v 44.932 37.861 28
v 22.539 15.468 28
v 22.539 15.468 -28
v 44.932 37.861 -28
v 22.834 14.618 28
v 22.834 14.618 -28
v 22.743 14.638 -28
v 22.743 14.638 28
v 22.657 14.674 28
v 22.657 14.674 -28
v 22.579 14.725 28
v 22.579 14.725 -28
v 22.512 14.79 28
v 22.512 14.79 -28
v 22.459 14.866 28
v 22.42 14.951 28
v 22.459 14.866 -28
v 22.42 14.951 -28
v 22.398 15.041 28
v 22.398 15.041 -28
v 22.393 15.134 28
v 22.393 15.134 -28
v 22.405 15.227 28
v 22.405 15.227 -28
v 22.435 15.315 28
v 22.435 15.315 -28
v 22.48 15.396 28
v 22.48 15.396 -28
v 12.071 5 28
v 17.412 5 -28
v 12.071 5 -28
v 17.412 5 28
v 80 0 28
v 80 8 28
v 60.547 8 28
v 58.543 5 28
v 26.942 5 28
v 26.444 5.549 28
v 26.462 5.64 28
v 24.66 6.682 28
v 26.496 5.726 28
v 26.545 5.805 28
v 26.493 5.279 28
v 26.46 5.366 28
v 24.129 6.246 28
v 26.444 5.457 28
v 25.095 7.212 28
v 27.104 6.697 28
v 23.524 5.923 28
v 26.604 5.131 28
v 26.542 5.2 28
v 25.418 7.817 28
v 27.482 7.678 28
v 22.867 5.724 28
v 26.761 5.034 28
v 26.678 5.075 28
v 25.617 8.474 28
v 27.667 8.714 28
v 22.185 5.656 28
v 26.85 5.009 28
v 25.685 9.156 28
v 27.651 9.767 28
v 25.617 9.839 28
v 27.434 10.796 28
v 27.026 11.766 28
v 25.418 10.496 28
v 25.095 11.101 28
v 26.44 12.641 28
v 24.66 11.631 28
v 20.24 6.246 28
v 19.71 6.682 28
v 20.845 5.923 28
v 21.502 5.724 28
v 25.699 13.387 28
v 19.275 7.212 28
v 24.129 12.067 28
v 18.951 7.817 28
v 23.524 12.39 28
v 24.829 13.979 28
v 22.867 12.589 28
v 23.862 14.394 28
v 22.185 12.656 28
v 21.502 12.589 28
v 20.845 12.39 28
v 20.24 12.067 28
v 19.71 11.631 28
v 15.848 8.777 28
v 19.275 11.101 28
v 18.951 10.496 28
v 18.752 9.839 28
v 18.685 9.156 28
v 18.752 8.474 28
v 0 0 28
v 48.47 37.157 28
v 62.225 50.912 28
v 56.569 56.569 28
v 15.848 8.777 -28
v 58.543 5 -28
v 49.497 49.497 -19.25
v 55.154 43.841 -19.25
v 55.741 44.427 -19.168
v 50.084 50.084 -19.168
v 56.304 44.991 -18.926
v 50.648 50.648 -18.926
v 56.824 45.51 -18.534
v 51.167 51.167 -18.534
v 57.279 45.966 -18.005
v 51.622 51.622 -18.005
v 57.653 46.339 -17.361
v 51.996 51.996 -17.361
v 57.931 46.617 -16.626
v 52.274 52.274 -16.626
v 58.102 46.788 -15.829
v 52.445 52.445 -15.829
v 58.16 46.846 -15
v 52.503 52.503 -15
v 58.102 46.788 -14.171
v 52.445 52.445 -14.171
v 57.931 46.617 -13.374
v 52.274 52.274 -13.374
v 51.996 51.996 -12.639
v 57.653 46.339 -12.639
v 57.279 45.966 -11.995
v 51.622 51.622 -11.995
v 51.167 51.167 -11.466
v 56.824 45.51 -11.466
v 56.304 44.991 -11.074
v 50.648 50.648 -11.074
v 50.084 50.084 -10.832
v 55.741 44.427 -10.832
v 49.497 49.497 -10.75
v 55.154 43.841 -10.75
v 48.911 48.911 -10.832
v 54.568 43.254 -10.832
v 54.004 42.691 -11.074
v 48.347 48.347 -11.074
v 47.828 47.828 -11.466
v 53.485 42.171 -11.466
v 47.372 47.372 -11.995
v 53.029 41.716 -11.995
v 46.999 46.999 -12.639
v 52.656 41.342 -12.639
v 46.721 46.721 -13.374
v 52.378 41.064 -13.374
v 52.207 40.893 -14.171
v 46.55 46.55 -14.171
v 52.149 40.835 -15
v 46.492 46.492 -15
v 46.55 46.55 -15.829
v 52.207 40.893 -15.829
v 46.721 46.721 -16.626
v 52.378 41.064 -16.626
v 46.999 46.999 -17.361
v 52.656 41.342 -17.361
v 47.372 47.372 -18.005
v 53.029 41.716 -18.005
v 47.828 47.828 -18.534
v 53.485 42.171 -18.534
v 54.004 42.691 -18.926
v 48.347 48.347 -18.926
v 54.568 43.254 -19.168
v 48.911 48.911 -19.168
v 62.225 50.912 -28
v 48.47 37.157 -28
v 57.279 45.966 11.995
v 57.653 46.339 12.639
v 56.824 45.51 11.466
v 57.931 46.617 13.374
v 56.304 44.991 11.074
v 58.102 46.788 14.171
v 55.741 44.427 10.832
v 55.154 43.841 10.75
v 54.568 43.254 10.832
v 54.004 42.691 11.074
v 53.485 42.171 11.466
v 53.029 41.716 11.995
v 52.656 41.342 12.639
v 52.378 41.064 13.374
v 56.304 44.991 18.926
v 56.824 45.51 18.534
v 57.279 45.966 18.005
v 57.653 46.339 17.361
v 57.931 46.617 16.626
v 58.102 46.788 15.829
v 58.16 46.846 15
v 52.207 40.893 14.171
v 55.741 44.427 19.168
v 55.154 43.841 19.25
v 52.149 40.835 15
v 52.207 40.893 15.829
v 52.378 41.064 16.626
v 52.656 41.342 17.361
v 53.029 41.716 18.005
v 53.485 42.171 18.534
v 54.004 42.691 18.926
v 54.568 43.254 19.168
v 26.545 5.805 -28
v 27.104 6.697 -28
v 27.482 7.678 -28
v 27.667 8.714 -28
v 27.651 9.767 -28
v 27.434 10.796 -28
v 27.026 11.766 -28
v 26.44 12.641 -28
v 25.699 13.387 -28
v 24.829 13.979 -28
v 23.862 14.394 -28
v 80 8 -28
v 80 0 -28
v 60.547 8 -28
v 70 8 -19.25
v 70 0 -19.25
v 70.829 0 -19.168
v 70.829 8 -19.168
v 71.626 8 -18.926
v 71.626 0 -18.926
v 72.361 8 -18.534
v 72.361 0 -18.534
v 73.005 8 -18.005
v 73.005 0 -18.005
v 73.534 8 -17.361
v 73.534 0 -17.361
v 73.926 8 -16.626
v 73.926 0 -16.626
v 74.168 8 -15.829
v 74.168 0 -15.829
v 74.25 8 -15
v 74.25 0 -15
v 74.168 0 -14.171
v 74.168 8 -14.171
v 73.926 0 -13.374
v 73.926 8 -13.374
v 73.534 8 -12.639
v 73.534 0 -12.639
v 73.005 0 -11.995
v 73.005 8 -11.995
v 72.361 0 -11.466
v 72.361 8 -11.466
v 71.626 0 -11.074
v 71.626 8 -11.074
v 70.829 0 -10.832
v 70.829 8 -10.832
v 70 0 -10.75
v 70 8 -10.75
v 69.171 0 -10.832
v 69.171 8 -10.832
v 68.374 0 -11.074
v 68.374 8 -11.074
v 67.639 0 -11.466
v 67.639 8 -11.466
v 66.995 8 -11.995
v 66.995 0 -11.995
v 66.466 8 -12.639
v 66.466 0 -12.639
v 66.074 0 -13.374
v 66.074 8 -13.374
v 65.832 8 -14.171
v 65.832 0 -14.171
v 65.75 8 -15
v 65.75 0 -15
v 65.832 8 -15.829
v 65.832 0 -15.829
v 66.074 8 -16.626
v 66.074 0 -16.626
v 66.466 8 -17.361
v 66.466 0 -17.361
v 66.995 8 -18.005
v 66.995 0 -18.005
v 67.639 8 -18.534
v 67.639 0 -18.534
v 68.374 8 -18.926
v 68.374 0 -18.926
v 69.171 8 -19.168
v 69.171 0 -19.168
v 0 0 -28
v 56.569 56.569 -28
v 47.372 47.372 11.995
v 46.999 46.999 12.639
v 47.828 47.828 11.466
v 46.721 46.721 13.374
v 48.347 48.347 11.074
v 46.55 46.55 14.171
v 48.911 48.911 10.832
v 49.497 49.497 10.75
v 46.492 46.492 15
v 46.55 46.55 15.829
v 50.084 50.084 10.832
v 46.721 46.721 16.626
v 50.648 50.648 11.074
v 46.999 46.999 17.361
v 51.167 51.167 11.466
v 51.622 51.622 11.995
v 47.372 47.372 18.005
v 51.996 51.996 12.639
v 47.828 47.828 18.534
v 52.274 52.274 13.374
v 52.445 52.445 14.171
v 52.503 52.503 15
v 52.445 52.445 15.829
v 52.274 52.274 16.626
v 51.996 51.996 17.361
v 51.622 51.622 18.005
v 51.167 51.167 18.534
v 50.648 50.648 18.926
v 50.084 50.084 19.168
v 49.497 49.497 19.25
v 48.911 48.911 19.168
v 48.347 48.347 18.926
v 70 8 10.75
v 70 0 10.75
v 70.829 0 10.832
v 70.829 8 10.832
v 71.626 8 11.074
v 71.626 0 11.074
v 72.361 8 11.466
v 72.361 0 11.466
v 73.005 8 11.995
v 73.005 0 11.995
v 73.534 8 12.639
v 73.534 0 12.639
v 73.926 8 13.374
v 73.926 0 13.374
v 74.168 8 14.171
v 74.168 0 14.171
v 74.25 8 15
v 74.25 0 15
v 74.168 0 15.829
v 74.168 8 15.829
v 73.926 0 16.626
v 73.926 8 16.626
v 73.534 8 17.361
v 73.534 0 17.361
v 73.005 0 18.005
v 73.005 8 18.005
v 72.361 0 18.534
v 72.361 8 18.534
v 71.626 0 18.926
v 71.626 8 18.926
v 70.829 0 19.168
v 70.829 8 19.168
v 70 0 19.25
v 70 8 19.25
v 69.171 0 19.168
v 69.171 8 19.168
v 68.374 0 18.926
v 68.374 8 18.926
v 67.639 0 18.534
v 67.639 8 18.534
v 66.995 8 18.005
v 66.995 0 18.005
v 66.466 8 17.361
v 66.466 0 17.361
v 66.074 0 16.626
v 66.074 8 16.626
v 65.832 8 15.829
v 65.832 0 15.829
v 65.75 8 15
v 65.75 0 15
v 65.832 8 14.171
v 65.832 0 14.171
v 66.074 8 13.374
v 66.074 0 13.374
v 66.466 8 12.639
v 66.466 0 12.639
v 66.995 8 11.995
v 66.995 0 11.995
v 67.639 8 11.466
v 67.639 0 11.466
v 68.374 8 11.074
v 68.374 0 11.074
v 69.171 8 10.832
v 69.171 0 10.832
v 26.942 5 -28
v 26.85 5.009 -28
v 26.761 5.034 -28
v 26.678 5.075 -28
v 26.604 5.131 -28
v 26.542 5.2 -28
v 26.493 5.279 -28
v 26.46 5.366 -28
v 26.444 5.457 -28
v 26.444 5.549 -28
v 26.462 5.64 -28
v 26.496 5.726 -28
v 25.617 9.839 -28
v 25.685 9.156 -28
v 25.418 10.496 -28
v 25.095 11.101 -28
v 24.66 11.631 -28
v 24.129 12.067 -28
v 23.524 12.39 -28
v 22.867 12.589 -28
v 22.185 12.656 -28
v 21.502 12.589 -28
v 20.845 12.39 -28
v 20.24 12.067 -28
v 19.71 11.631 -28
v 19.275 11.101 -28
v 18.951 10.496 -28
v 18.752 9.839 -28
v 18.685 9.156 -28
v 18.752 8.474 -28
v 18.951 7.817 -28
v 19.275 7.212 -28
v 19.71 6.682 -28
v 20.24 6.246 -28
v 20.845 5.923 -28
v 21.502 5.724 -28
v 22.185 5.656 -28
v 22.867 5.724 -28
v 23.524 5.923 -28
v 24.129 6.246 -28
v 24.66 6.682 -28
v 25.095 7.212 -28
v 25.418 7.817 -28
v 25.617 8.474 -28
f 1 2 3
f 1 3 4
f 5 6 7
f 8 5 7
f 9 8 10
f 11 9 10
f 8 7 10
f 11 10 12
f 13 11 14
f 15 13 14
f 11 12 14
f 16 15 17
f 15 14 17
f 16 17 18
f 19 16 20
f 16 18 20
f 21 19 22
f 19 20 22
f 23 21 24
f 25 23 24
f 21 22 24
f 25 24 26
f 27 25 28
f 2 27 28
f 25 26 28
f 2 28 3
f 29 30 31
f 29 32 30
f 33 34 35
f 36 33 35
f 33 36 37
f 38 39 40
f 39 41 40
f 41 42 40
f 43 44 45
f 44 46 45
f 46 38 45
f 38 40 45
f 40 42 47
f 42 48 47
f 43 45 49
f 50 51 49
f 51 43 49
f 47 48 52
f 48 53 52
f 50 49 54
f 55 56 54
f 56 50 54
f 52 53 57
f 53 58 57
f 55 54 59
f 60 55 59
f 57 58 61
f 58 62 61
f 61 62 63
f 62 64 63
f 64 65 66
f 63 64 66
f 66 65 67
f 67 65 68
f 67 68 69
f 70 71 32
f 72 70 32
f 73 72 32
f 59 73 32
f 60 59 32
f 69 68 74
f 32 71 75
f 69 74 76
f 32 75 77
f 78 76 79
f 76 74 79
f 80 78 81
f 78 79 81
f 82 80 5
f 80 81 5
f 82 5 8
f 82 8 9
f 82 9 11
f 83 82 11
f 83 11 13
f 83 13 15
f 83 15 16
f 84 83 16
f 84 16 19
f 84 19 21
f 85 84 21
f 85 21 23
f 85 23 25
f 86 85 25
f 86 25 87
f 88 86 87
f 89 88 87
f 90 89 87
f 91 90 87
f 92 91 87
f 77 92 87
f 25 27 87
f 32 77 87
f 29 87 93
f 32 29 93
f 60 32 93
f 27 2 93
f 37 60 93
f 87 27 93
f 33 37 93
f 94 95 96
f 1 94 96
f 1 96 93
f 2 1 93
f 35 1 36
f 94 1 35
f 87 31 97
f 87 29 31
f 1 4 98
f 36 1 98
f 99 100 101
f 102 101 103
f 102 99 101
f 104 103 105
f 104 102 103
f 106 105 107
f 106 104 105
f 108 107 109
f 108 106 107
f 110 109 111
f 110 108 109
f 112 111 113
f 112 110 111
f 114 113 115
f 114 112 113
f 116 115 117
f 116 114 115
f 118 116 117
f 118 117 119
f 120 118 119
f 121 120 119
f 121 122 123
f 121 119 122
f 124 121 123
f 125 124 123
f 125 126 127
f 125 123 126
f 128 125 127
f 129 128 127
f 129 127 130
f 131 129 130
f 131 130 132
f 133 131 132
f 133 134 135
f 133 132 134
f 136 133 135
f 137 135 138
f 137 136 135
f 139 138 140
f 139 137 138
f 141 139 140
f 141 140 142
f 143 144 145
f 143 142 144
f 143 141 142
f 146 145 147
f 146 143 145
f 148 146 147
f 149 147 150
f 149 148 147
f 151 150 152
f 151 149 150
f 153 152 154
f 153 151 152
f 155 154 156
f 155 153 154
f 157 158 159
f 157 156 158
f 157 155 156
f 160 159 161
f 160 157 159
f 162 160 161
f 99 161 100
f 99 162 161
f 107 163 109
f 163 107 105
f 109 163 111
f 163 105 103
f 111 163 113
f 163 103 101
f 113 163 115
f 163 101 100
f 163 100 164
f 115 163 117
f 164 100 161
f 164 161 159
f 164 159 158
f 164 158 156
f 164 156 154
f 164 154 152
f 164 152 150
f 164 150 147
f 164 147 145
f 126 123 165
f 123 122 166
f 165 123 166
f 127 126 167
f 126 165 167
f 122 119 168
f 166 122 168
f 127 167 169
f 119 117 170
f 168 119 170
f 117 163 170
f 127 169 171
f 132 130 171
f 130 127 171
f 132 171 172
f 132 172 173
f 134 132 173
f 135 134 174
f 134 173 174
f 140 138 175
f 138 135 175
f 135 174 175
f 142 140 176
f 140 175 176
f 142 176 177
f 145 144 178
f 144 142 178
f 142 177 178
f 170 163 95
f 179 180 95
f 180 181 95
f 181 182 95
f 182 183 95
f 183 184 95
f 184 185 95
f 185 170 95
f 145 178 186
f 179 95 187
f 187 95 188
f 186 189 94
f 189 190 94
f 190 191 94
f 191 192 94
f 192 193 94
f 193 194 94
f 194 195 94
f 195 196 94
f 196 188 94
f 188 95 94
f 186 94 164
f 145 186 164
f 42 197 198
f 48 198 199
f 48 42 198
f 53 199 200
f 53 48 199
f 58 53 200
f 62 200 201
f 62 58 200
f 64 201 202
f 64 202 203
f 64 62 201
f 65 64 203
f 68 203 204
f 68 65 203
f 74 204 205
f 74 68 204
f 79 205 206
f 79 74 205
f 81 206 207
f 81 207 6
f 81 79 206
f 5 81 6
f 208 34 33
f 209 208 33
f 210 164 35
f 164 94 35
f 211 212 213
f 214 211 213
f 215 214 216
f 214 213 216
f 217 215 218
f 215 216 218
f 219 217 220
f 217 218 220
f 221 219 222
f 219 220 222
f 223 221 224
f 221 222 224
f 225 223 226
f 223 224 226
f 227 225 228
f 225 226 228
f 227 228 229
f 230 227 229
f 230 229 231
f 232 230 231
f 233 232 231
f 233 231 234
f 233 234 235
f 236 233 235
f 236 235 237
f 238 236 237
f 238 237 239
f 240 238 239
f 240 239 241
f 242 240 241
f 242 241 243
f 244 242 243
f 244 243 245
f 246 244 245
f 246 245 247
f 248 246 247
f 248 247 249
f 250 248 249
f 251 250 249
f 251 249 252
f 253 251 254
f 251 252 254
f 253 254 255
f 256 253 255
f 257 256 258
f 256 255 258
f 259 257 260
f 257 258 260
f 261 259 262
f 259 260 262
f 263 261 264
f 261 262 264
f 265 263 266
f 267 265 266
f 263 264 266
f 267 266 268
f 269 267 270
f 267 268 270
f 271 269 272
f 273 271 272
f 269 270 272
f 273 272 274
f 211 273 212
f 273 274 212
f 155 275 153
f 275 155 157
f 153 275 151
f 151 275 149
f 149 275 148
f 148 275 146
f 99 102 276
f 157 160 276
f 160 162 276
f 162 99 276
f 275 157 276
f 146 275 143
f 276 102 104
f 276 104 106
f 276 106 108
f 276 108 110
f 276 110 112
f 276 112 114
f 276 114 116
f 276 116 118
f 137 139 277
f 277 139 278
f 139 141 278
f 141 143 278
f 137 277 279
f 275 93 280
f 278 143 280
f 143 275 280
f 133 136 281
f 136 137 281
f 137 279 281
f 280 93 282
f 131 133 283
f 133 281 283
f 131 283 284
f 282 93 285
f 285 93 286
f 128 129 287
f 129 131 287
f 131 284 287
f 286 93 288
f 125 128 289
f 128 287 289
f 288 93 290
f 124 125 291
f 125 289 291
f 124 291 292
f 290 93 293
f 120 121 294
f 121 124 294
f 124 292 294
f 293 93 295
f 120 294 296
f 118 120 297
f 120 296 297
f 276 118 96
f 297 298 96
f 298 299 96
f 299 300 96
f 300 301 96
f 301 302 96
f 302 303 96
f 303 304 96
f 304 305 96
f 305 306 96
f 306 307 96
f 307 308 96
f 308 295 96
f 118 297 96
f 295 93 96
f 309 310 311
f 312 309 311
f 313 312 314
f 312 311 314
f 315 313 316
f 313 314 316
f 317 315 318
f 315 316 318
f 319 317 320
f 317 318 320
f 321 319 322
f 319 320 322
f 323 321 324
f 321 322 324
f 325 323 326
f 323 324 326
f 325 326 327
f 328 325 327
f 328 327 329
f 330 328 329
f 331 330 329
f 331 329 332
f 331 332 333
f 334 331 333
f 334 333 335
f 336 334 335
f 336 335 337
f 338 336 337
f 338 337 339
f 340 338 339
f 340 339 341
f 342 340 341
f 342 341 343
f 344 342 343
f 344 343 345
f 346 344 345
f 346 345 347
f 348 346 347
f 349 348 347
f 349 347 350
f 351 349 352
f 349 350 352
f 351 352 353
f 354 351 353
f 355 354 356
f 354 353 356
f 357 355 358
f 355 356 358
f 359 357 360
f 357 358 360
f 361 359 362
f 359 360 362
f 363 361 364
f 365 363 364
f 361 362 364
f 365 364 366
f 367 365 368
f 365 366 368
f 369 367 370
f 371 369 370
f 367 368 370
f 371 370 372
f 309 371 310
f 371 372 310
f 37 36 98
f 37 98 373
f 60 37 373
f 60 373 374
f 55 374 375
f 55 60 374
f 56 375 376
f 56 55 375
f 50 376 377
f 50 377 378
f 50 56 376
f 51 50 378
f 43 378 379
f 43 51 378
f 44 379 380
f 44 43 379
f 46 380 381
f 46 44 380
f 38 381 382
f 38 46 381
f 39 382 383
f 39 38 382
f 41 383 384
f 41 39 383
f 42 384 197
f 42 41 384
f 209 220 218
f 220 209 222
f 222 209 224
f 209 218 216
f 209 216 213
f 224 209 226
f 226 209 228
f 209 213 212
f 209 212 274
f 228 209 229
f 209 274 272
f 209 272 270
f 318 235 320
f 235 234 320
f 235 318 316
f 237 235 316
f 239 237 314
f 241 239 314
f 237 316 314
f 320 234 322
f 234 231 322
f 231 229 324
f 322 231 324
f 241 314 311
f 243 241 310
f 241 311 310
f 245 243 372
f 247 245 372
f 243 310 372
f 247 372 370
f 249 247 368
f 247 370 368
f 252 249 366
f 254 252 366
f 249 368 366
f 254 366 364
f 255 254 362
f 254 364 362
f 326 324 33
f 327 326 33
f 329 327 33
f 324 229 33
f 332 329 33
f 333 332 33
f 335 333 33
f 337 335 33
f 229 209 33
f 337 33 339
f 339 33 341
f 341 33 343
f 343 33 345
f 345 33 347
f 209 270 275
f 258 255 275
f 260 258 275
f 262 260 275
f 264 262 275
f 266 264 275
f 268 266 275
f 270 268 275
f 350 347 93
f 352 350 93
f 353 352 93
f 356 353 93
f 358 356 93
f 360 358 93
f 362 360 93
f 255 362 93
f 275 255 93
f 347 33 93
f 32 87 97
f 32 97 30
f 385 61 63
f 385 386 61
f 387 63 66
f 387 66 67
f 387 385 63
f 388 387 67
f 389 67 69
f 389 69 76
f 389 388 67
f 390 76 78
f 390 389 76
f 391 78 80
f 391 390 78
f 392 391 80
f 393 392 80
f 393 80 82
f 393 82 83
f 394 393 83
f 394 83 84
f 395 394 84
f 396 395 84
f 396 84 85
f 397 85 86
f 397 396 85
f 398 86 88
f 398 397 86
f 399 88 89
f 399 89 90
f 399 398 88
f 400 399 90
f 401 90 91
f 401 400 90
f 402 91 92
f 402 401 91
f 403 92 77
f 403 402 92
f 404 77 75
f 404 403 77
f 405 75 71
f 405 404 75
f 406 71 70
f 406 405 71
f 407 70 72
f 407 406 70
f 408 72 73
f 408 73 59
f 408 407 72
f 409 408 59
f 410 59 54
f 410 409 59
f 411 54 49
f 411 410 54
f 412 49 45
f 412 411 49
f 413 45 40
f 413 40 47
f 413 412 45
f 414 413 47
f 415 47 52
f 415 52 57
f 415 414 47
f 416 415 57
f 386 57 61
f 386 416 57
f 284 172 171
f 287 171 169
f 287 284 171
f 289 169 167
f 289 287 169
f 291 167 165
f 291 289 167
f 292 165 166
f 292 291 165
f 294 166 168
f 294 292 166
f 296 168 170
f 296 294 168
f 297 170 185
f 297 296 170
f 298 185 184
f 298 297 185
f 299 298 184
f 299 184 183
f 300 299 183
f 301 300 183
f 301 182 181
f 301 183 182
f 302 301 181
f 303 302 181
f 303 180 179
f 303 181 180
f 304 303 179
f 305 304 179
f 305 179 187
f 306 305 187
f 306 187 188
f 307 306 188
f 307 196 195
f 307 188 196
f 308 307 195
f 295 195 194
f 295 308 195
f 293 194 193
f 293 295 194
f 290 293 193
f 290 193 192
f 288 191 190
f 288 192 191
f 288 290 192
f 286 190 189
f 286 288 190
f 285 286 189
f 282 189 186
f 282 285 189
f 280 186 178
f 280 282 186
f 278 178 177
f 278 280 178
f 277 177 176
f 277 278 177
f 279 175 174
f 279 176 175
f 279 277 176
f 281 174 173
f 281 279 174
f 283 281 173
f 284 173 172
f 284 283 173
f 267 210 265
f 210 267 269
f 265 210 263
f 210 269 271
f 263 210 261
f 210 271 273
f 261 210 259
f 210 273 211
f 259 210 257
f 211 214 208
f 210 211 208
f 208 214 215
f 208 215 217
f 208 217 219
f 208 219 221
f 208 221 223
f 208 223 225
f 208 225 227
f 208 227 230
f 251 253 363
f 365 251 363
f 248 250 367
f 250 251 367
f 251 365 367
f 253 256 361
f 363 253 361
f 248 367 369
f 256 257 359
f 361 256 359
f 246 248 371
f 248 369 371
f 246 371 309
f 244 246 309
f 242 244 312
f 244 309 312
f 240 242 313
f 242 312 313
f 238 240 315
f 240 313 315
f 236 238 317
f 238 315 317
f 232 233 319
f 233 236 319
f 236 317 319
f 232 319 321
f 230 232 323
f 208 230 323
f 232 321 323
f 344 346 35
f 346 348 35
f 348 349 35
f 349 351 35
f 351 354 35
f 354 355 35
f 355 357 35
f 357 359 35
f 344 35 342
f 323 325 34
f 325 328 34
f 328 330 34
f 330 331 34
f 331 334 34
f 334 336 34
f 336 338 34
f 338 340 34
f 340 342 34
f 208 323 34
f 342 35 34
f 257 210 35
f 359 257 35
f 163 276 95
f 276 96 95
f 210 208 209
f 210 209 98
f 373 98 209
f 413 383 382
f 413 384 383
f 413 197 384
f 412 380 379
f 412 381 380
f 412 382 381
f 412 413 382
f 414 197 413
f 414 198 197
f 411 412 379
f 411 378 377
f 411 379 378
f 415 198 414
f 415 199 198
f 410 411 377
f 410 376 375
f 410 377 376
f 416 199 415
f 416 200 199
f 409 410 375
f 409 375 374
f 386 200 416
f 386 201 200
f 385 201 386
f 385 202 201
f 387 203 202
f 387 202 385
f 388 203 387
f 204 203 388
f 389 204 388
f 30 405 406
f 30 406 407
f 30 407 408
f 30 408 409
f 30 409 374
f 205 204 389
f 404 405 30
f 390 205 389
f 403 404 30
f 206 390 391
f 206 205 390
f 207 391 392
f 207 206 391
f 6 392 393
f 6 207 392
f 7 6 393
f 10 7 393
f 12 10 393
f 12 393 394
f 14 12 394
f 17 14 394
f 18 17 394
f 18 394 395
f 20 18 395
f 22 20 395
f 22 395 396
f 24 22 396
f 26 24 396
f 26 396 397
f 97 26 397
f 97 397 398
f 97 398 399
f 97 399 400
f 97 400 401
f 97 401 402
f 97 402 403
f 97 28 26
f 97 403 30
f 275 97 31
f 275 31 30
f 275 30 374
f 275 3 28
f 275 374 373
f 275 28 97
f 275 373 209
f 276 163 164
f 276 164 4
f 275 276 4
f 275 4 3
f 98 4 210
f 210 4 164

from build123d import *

# Parameters (mm, degrees)
SKETCH_1_R          = 3.5
EXTRUDE_1_DEPTH     = 28
SKETCH_3_R          = 4.25
CUT_EXTRUDE_2_DEPTH = 20


with BuildPart() as part:
    # 草图1 → 凸台-拉伸1 (new, symmetric)
    with BuildSketch(Plane.XY):
        Polygon((0, 0), (56.568542495, 56.568542495), (62.225396744, 50.911688245), (48.470353518, 37.156645019), (60.547431318, 8), (80, 8), (80, 0), align=None)
        with Locations((22.184677187, 9.156473773)):
            Circle(SKETCH_1_R, mode=Mode.SUBTRACT)
        Polygon((12.071067812, 5), (15.847671377, 8.776603565), (17.411991793, 5), align=None, mode=Mode.SUBTRACT)
        with BuildLine():
            Line((22.539170943, 15.468103131), (44.931612237, 37.860544425))
            Line((44.931612237, 37.860544425), (58.542895405, 5))
            Line((58.542895405, 5), (26.941798117, 5))
            ThreePointArc((26.941798117, 5), (26.493271042, 5.27903968), (26.545371373, 5.804706148))
            ThreePointArc((26.545371373, 5.804706148), (27.253512915, 11.291164467), (22.833720405, 14.61804341))
            ThreePointArc((22.833720405, 14.61804341), (22.420282519, 14.950846558), (22.539170943, 15.468103131))
        make_face(mode=Mode.SUBTRACT)
    extrude(amount=EXTRUDE_1_DEPTH, both=True)

    # 草图3 → 切除-拉伸2 (cut)
    with BuildSketch(Plane.XZ):
        with Locations(Location((70, 15, 0), (0, 0, 270))):
            Circle(SKETCH_3_R)
        with Locations(Location((70, -15, 0), (0, 0, 270))):
            Circle(SKETCH_3_R)
    cut_extrude_2 = extrude(amount=-CUT_EXTRUDE_2_DEPTH, mode=Mode.SUBTRACT)

    # 镜向1: 切除-拉伸2 across plane
    add(cut_extrude_2.mirror(Plane(origin=(0, 0, 0), x_dir=(0, 0, 1), z_dir=(0.3826834323650904, -0.9238795325112865, 0))), mode=Mode.SUBTRACT)


solid = part.part
